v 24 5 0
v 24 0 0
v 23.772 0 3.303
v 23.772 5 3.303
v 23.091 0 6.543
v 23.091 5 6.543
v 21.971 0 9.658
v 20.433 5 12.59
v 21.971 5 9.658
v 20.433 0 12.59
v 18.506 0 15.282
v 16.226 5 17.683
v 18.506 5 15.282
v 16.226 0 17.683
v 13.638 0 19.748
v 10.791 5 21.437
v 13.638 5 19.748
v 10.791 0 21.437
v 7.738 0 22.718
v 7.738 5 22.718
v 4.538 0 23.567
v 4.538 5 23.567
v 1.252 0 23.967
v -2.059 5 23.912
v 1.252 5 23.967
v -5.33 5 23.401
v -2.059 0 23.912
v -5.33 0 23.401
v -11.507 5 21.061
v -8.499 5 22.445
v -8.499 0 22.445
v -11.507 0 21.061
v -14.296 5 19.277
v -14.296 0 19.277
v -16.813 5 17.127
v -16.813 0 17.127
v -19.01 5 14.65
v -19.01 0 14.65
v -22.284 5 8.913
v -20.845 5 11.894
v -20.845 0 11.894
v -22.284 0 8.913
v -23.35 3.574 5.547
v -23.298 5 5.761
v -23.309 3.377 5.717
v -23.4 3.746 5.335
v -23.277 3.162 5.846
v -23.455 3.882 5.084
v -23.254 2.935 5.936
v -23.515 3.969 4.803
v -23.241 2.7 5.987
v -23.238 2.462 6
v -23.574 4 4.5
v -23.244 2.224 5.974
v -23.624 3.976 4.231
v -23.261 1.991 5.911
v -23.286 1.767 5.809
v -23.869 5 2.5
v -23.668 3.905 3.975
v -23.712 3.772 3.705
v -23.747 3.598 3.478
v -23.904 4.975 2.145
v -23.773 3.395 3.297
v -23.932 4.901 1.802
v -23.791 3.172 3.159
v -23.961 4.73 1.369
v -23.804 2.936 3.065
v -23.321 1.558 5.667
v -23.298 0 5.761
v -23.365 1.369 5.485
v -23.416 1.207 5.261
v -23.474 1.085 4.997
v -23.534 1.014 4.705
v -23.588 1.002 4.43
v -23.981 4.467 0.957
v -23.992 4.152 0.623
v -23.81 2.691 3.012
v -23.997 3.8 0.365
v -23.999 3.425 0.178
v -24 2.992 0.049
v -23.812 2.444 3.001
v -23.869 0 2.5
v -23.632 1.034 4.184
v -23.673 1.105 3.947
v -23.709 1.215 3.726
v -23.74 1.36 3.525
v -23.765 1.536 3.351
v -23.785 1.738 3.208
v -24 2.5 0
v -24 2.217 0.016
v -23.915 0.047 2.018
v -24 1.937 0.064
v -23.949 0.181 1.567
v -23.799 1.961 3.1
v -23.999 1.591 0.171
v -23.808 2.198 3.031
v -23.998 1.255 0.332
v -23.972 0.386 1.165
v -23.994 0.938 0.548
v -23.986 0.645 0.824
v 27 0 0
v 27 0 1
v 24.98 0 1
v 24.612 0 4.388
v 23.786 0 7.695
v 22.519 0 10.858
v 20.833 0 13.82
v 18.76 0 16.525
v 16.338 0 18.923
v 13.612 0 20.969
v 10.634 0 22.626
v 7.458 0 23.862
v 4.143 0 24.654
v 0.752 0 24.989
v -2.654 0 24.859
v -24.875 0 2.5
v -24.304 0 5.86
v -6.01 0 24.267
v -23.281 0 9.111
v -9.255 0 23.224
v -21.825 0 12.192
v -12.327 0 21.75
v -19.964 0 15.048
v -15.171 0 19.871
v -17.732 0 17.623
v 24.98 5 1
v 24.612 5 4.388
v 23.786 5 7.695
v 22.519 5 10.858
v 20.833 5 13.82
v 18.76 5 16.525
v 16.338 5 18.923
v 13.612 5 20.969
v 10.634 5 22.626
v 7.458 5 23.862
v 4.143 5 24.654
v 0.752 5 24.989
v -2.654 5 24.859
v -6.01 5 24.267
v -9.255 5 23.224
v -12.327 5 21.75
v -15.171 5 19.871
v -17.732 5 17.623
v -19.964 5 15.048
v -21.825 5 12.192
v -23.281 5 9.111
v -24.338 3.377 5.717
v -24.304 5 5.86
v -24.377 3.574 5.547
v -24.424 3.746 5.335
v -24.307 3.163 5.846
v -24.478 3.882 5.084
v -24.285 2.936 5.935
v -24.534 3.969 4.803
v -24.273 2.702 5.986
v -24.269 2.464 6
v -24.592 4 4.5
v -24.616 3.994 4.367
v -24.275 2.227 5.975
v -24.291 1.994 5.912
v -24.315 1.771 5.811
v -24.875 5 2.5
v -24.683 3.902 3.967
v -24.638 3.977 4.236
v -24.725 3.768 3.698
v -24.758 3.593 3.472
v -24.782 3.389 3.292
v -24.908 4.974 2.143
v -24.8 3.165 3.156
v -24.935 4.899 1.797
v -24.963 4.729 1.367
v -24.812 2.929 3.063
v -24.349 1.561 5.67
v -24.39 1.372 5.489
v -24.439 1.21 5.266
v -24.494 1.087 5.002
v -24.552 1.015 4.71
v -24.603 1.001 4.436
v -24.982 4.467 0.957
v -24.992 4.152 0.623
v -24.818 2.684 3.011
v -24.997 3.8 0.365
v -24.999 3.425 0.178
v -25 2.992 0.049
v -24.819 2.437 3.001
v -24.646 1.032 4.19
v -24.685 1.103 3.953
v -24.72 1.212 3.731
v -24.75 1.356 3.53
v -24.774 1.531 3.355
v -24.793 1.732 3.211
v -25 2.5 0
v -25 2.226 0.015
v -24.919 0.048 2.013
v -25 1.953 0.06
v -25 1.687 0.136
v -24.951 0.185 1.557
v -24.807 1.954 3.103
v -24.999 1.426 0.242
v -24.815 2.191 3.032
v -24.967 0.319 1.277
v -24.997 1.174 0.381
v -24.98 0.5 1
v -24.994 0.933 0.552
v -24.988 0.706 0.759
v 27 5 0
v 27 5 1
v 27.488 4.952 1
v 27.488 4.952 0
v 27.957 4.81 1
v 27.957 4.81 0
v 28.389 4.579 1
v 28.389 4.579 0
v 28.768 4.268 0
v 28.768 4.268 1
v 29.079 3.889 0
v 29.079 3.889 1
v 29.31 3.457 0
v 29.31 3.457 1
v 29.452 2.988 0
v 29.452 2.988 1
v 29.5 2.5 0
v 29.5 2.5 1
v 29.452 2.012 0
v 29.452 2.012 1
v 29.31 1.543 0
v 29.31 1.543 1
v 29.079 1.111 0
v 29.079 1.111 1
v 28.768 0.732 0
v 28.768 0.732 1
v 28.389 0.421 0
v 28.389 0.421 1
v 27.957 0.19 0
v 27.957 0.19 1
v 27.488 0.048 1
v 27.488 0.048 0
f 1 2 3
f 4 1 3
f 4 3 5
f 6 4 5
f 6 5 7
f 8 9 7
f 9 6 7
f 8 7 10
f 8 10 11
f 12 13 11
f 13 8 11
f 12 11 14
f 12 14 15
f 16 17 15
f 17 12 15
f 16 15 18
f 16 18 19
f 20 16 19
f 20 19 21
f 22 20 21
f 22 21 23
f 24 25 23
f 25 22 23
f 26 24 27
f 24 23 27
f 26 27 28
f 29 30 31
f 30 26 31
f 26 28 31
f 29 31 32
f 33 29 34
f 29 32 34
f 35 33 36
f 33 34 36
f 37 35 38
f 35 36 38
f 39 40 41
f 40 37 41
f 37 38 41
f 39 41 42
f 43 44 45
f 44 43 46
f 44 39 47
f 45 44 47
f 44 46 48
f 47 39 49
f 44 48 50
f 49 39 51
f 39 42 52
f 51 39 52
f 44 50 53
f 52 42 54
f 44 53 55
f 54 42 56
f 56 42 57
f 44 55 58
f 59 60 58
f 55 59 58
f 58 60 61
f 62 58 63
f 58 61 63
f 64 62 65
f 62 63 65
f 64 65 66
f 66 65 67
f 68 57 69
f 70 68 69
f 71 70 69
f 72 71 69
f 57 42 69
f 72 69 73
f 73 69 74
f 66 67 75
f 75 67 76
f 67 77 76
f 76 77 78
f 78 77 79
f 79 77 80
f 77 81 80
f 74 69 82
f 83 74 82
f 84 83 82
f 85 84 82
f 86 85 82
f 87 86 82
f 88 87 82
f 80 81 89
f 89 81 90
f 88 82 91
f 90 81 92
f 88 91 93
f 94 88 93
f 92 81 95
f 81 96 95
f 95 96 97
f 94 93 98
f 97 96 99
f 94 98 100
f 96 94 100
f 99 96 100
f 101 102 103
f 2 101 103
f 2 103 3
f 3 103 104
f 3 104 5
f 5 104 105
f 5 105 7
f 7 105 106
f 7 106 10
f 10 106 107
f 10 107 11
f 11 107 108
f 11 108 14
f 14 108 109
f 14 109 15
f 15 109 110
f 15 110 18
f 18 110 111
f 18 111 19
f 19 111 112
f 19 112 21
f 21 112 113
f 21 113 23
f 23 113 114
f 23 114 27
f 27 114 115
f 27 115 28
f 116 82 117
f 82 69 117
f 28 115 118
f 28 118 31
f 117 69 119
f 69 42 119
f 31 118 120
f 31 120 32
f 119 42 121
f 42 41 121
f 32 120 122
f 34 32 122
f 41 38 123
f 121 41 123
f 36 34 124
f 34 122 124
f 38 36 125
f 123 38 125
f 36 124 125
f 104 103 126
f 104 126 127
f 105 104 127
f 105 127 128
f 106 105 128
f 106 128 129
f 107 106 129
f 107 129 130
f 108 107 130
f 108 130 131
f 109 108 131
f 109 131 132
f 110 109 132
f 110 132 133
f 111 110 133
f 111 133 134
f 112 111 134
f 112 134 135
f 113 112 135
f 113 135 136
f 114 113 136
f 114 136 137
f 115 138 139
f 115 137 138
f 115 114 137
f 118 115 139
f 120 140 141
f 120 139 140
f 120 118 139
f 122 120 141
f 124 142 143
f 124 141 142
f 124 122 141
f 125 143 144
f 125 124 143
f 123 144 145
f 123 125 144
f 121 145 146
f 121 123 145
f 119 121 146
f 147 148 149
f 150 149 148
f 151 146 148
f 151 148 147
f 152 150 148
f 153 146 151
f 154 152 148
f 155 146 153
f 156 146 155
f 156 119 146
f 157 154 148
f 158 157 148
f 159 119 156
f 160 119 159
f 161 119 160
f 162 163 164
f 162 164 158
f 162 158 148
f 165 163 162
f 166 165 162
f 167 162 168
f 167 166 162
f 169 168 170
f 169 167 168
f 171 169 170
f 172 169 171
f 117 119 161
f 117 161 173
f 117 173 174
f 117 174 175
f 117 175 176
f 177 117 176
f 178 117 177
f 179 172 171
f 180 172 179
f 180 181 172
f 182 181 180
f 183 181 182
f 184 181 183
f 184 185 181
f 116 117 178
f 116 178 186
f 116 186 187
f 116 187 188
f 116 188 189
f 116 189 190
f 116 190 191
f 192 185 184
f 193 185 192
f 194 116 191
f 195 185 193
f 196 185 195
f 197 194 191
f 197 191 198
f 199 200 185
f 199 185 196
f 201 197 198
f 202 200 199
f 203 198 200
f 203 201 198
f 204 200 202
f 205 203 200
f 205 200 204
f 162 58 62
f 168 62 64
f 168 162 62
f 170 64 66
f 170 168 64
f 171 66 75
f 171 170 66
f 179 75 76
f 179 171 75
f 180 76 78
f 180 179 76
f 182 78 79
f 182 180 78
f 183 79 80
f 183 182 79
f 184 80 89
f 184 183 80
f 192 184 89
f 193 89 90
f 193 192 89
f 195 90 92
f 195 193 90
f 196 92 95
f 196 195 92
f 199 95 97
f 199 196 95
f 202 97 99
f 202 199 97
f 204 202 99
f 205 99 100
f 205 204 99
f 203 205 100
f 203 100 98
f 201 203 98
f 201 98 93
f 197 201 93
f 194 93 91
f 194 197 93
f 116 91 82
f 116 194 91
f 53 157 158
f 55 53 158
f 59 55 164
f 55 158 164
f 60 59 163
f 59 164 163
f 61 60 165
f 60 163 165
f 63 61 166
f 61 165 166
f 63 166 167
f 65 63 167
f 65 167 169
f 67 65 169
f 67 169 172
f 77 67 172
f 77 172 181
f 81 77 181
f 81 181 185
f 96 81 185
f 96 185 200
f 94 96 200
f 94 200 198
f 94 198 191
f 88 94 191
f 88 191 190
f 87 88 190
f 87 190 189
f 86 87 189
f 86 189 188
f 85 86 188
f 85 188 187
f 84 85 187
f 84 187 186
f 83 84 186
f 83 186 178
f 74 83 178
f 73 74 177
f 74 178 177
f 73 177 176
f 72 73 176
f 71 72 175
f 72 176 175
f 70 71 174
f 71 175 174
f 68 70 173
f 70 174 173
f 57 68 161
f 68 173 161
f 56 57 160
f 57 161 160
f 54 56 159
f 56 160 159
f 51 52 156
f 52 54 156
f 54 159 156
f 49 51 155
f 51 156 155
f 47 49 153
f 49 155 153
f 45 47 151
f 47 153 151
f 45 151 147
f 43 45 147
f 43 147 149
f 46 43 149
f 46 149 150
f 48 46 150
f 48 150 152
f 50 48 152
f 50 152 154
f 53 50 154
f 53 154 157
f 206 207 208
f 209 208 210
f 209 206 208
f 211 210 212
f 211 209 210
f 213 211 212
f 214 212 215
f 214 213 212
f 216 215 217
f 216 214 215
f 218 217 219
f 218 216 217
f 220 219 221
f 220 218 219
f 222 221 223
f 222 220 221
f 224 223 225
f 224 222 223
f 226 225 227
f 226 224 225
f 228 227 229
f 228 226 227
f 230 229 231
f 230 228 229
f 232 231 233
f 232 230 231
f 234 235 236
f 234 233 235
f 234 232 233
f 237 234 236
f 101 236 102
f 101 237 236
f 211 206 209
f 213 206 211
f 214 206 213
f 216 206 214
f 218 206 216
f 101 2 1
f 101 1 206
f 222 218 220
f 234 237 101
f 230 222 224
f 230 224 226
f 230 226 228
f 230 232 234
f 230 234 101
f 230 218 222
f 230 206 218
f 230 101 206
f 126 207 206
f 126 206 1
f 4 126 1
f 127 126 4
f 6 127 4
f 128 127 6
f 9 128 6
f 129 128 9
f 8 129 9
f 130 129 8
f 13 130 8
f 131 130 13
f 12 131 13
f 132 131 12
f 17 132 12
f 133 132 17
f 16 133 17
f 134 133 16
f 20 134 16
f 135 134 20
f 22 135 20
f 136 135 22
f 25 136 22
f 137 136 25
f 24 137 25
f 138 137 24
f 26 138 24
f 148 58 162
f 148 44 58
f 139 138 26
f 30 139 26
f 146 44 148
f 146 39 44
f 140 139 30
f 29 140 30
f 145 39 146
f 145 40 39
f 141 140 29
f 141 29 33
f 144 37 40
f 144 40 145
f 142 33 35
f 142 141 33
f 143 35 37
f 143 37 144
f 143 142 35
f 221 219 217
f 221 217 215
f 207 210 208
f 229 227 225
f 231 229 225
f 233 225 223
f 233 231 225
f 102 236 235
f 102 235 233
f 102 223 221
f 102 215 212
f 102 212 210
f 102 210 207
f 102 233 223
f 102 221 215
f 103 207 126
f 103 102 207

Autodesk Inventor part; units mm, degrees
ref_plane "XZ Plane" through (0, 0, 0) normal (0, 1, 0) x (-1, 0, 0)
ref_plane "XY Plane" through (0, 0, 0) normal (0, 0, 1) x (1, 0, 0)
sketch "Sketch1" plane through (0, 0, 0) normal (0, 1, 0) x (-1, 0, 0)
  arc A0 (25, 0) -> (-24.98, 1) centre (0, 0) ccw
  arc A1 (24, 0) -> (-24, 0) centre (0, 0) ccw
  line L0 (25, 0) -> (24, 0)
  line L1 (-24, 0) -> (-25, 0)
  line L2 (-24, 0) -> (-29.5, 0)
  line L3 (-29.5, 0) -> (-29.5, 1)
  line L4 (-29.5, 1) -> (-24.98, 1)
  line L5 (-24, 1) -> (-24, 0)
extrude "Extrusion1" add sketch "Sketch1" along normal blind 5
sketch "Sketch2" plane through (29.5, 0, 0) normal (0, 0, -1) x (-1, 0, 0)
  line L0 (0, 0) -> (5.5, 0) projected
  arc A0 (2.5, 5) -> (2.5, 0) centre (2.5, 2.5) ccw
  line L1 (0, 0) -> (2.5, 0)
  line L2 (4.52, 0) -> (0, 0) projected
  line L3 (0, 0) -> (0, 2.5)
  line L4 (0, 0) -> (0, 5) projected
  line L5 (0, 2.5) -> (0, 5)
  line L6 (0, 5) -> (2.26, 5)
  line L7 (4.52, 5) -> (0, 5) projected
  line L8 (2.5, 5) -> (0, 5)
  line L9 (0, 2.5) -> (0, 5)
  line L10 (0, 2.5) -> (0, 0)
  line L11 (0, 0) -> (2.5, 0)
  arc A1 (0, 2.5) -> (2.5, 0) centre (2.5, 2.5) ccw
  arc A2 (2.5, 5) -> (0, 2.5) centre (2.5, 2.5) ccw
  point P0 (29.5, 0)
extrude "Extrusion2" cut sketch "Sketch2" against normal through all
ref_plane "Work Plane1" through (-25, 0, 0) normal (1, 0, 0) x (0, 1, 0)
sketch "Sketch3" plane through (-25, 0, 0) normal (1, 0, 0) x (0, 1, 0)
  line L0 (5, 0) -> (5, 25) construction
  line L1 (0, 0) -> (0, 2) construction
  line L2 (0, 0) -> (0, 25) construction
  line L3 (0, 0) -> (0, 2.5) construction
  arc A0 (0, 2.5) -> (5, 2.5) centre (2.5, 2.5) ccw
  line L4 (0, 0) -> (0, 2.5)
  line L5 (0, 0) -> (5, 0) projected
  line L6 (0, 0) -> (2.5, 0)
  line L7 (2.5, 0) -> (5, 0)
  line L8 (5, 0) -> (5, 2.5)
  arc A1 (0, 2.5) -> (2.5, 0) centre (2.5, 2.5) ccw
  arc A2 (2.5, 0) -> (5, 2.5) centre (2.5, 2.5) ccw
  point P0 (0, 1)
  point P1 (5, 1)
extrude "Extrusion3" cut sketch "Sketch3" along normal blind 3
sketch "Sketch4" plane through (-25, 0, 0) normal (1, 0, 0) x (0, 1, 0)
  line L0 (0, 0) -> (0, 4.5) construction
  line L1 (0, 24) -> (0, 0) construction
  line L2 (0, 4.5) -> (5, 4.5) construction
  line L3 (5, 24) -> (5, 0) construction
  circle A0 centre (2.5, 4.5) radius 1.5
  point P0 (0, 2.5)
  point P1 (5, 2.5)
  dimension "d15" = 4.5
  dimension "d16" = 3
extrude "Extrusion4" cut sketch "Sketch4" along normal blind 4
properties part number "Metal icecream cutter"
